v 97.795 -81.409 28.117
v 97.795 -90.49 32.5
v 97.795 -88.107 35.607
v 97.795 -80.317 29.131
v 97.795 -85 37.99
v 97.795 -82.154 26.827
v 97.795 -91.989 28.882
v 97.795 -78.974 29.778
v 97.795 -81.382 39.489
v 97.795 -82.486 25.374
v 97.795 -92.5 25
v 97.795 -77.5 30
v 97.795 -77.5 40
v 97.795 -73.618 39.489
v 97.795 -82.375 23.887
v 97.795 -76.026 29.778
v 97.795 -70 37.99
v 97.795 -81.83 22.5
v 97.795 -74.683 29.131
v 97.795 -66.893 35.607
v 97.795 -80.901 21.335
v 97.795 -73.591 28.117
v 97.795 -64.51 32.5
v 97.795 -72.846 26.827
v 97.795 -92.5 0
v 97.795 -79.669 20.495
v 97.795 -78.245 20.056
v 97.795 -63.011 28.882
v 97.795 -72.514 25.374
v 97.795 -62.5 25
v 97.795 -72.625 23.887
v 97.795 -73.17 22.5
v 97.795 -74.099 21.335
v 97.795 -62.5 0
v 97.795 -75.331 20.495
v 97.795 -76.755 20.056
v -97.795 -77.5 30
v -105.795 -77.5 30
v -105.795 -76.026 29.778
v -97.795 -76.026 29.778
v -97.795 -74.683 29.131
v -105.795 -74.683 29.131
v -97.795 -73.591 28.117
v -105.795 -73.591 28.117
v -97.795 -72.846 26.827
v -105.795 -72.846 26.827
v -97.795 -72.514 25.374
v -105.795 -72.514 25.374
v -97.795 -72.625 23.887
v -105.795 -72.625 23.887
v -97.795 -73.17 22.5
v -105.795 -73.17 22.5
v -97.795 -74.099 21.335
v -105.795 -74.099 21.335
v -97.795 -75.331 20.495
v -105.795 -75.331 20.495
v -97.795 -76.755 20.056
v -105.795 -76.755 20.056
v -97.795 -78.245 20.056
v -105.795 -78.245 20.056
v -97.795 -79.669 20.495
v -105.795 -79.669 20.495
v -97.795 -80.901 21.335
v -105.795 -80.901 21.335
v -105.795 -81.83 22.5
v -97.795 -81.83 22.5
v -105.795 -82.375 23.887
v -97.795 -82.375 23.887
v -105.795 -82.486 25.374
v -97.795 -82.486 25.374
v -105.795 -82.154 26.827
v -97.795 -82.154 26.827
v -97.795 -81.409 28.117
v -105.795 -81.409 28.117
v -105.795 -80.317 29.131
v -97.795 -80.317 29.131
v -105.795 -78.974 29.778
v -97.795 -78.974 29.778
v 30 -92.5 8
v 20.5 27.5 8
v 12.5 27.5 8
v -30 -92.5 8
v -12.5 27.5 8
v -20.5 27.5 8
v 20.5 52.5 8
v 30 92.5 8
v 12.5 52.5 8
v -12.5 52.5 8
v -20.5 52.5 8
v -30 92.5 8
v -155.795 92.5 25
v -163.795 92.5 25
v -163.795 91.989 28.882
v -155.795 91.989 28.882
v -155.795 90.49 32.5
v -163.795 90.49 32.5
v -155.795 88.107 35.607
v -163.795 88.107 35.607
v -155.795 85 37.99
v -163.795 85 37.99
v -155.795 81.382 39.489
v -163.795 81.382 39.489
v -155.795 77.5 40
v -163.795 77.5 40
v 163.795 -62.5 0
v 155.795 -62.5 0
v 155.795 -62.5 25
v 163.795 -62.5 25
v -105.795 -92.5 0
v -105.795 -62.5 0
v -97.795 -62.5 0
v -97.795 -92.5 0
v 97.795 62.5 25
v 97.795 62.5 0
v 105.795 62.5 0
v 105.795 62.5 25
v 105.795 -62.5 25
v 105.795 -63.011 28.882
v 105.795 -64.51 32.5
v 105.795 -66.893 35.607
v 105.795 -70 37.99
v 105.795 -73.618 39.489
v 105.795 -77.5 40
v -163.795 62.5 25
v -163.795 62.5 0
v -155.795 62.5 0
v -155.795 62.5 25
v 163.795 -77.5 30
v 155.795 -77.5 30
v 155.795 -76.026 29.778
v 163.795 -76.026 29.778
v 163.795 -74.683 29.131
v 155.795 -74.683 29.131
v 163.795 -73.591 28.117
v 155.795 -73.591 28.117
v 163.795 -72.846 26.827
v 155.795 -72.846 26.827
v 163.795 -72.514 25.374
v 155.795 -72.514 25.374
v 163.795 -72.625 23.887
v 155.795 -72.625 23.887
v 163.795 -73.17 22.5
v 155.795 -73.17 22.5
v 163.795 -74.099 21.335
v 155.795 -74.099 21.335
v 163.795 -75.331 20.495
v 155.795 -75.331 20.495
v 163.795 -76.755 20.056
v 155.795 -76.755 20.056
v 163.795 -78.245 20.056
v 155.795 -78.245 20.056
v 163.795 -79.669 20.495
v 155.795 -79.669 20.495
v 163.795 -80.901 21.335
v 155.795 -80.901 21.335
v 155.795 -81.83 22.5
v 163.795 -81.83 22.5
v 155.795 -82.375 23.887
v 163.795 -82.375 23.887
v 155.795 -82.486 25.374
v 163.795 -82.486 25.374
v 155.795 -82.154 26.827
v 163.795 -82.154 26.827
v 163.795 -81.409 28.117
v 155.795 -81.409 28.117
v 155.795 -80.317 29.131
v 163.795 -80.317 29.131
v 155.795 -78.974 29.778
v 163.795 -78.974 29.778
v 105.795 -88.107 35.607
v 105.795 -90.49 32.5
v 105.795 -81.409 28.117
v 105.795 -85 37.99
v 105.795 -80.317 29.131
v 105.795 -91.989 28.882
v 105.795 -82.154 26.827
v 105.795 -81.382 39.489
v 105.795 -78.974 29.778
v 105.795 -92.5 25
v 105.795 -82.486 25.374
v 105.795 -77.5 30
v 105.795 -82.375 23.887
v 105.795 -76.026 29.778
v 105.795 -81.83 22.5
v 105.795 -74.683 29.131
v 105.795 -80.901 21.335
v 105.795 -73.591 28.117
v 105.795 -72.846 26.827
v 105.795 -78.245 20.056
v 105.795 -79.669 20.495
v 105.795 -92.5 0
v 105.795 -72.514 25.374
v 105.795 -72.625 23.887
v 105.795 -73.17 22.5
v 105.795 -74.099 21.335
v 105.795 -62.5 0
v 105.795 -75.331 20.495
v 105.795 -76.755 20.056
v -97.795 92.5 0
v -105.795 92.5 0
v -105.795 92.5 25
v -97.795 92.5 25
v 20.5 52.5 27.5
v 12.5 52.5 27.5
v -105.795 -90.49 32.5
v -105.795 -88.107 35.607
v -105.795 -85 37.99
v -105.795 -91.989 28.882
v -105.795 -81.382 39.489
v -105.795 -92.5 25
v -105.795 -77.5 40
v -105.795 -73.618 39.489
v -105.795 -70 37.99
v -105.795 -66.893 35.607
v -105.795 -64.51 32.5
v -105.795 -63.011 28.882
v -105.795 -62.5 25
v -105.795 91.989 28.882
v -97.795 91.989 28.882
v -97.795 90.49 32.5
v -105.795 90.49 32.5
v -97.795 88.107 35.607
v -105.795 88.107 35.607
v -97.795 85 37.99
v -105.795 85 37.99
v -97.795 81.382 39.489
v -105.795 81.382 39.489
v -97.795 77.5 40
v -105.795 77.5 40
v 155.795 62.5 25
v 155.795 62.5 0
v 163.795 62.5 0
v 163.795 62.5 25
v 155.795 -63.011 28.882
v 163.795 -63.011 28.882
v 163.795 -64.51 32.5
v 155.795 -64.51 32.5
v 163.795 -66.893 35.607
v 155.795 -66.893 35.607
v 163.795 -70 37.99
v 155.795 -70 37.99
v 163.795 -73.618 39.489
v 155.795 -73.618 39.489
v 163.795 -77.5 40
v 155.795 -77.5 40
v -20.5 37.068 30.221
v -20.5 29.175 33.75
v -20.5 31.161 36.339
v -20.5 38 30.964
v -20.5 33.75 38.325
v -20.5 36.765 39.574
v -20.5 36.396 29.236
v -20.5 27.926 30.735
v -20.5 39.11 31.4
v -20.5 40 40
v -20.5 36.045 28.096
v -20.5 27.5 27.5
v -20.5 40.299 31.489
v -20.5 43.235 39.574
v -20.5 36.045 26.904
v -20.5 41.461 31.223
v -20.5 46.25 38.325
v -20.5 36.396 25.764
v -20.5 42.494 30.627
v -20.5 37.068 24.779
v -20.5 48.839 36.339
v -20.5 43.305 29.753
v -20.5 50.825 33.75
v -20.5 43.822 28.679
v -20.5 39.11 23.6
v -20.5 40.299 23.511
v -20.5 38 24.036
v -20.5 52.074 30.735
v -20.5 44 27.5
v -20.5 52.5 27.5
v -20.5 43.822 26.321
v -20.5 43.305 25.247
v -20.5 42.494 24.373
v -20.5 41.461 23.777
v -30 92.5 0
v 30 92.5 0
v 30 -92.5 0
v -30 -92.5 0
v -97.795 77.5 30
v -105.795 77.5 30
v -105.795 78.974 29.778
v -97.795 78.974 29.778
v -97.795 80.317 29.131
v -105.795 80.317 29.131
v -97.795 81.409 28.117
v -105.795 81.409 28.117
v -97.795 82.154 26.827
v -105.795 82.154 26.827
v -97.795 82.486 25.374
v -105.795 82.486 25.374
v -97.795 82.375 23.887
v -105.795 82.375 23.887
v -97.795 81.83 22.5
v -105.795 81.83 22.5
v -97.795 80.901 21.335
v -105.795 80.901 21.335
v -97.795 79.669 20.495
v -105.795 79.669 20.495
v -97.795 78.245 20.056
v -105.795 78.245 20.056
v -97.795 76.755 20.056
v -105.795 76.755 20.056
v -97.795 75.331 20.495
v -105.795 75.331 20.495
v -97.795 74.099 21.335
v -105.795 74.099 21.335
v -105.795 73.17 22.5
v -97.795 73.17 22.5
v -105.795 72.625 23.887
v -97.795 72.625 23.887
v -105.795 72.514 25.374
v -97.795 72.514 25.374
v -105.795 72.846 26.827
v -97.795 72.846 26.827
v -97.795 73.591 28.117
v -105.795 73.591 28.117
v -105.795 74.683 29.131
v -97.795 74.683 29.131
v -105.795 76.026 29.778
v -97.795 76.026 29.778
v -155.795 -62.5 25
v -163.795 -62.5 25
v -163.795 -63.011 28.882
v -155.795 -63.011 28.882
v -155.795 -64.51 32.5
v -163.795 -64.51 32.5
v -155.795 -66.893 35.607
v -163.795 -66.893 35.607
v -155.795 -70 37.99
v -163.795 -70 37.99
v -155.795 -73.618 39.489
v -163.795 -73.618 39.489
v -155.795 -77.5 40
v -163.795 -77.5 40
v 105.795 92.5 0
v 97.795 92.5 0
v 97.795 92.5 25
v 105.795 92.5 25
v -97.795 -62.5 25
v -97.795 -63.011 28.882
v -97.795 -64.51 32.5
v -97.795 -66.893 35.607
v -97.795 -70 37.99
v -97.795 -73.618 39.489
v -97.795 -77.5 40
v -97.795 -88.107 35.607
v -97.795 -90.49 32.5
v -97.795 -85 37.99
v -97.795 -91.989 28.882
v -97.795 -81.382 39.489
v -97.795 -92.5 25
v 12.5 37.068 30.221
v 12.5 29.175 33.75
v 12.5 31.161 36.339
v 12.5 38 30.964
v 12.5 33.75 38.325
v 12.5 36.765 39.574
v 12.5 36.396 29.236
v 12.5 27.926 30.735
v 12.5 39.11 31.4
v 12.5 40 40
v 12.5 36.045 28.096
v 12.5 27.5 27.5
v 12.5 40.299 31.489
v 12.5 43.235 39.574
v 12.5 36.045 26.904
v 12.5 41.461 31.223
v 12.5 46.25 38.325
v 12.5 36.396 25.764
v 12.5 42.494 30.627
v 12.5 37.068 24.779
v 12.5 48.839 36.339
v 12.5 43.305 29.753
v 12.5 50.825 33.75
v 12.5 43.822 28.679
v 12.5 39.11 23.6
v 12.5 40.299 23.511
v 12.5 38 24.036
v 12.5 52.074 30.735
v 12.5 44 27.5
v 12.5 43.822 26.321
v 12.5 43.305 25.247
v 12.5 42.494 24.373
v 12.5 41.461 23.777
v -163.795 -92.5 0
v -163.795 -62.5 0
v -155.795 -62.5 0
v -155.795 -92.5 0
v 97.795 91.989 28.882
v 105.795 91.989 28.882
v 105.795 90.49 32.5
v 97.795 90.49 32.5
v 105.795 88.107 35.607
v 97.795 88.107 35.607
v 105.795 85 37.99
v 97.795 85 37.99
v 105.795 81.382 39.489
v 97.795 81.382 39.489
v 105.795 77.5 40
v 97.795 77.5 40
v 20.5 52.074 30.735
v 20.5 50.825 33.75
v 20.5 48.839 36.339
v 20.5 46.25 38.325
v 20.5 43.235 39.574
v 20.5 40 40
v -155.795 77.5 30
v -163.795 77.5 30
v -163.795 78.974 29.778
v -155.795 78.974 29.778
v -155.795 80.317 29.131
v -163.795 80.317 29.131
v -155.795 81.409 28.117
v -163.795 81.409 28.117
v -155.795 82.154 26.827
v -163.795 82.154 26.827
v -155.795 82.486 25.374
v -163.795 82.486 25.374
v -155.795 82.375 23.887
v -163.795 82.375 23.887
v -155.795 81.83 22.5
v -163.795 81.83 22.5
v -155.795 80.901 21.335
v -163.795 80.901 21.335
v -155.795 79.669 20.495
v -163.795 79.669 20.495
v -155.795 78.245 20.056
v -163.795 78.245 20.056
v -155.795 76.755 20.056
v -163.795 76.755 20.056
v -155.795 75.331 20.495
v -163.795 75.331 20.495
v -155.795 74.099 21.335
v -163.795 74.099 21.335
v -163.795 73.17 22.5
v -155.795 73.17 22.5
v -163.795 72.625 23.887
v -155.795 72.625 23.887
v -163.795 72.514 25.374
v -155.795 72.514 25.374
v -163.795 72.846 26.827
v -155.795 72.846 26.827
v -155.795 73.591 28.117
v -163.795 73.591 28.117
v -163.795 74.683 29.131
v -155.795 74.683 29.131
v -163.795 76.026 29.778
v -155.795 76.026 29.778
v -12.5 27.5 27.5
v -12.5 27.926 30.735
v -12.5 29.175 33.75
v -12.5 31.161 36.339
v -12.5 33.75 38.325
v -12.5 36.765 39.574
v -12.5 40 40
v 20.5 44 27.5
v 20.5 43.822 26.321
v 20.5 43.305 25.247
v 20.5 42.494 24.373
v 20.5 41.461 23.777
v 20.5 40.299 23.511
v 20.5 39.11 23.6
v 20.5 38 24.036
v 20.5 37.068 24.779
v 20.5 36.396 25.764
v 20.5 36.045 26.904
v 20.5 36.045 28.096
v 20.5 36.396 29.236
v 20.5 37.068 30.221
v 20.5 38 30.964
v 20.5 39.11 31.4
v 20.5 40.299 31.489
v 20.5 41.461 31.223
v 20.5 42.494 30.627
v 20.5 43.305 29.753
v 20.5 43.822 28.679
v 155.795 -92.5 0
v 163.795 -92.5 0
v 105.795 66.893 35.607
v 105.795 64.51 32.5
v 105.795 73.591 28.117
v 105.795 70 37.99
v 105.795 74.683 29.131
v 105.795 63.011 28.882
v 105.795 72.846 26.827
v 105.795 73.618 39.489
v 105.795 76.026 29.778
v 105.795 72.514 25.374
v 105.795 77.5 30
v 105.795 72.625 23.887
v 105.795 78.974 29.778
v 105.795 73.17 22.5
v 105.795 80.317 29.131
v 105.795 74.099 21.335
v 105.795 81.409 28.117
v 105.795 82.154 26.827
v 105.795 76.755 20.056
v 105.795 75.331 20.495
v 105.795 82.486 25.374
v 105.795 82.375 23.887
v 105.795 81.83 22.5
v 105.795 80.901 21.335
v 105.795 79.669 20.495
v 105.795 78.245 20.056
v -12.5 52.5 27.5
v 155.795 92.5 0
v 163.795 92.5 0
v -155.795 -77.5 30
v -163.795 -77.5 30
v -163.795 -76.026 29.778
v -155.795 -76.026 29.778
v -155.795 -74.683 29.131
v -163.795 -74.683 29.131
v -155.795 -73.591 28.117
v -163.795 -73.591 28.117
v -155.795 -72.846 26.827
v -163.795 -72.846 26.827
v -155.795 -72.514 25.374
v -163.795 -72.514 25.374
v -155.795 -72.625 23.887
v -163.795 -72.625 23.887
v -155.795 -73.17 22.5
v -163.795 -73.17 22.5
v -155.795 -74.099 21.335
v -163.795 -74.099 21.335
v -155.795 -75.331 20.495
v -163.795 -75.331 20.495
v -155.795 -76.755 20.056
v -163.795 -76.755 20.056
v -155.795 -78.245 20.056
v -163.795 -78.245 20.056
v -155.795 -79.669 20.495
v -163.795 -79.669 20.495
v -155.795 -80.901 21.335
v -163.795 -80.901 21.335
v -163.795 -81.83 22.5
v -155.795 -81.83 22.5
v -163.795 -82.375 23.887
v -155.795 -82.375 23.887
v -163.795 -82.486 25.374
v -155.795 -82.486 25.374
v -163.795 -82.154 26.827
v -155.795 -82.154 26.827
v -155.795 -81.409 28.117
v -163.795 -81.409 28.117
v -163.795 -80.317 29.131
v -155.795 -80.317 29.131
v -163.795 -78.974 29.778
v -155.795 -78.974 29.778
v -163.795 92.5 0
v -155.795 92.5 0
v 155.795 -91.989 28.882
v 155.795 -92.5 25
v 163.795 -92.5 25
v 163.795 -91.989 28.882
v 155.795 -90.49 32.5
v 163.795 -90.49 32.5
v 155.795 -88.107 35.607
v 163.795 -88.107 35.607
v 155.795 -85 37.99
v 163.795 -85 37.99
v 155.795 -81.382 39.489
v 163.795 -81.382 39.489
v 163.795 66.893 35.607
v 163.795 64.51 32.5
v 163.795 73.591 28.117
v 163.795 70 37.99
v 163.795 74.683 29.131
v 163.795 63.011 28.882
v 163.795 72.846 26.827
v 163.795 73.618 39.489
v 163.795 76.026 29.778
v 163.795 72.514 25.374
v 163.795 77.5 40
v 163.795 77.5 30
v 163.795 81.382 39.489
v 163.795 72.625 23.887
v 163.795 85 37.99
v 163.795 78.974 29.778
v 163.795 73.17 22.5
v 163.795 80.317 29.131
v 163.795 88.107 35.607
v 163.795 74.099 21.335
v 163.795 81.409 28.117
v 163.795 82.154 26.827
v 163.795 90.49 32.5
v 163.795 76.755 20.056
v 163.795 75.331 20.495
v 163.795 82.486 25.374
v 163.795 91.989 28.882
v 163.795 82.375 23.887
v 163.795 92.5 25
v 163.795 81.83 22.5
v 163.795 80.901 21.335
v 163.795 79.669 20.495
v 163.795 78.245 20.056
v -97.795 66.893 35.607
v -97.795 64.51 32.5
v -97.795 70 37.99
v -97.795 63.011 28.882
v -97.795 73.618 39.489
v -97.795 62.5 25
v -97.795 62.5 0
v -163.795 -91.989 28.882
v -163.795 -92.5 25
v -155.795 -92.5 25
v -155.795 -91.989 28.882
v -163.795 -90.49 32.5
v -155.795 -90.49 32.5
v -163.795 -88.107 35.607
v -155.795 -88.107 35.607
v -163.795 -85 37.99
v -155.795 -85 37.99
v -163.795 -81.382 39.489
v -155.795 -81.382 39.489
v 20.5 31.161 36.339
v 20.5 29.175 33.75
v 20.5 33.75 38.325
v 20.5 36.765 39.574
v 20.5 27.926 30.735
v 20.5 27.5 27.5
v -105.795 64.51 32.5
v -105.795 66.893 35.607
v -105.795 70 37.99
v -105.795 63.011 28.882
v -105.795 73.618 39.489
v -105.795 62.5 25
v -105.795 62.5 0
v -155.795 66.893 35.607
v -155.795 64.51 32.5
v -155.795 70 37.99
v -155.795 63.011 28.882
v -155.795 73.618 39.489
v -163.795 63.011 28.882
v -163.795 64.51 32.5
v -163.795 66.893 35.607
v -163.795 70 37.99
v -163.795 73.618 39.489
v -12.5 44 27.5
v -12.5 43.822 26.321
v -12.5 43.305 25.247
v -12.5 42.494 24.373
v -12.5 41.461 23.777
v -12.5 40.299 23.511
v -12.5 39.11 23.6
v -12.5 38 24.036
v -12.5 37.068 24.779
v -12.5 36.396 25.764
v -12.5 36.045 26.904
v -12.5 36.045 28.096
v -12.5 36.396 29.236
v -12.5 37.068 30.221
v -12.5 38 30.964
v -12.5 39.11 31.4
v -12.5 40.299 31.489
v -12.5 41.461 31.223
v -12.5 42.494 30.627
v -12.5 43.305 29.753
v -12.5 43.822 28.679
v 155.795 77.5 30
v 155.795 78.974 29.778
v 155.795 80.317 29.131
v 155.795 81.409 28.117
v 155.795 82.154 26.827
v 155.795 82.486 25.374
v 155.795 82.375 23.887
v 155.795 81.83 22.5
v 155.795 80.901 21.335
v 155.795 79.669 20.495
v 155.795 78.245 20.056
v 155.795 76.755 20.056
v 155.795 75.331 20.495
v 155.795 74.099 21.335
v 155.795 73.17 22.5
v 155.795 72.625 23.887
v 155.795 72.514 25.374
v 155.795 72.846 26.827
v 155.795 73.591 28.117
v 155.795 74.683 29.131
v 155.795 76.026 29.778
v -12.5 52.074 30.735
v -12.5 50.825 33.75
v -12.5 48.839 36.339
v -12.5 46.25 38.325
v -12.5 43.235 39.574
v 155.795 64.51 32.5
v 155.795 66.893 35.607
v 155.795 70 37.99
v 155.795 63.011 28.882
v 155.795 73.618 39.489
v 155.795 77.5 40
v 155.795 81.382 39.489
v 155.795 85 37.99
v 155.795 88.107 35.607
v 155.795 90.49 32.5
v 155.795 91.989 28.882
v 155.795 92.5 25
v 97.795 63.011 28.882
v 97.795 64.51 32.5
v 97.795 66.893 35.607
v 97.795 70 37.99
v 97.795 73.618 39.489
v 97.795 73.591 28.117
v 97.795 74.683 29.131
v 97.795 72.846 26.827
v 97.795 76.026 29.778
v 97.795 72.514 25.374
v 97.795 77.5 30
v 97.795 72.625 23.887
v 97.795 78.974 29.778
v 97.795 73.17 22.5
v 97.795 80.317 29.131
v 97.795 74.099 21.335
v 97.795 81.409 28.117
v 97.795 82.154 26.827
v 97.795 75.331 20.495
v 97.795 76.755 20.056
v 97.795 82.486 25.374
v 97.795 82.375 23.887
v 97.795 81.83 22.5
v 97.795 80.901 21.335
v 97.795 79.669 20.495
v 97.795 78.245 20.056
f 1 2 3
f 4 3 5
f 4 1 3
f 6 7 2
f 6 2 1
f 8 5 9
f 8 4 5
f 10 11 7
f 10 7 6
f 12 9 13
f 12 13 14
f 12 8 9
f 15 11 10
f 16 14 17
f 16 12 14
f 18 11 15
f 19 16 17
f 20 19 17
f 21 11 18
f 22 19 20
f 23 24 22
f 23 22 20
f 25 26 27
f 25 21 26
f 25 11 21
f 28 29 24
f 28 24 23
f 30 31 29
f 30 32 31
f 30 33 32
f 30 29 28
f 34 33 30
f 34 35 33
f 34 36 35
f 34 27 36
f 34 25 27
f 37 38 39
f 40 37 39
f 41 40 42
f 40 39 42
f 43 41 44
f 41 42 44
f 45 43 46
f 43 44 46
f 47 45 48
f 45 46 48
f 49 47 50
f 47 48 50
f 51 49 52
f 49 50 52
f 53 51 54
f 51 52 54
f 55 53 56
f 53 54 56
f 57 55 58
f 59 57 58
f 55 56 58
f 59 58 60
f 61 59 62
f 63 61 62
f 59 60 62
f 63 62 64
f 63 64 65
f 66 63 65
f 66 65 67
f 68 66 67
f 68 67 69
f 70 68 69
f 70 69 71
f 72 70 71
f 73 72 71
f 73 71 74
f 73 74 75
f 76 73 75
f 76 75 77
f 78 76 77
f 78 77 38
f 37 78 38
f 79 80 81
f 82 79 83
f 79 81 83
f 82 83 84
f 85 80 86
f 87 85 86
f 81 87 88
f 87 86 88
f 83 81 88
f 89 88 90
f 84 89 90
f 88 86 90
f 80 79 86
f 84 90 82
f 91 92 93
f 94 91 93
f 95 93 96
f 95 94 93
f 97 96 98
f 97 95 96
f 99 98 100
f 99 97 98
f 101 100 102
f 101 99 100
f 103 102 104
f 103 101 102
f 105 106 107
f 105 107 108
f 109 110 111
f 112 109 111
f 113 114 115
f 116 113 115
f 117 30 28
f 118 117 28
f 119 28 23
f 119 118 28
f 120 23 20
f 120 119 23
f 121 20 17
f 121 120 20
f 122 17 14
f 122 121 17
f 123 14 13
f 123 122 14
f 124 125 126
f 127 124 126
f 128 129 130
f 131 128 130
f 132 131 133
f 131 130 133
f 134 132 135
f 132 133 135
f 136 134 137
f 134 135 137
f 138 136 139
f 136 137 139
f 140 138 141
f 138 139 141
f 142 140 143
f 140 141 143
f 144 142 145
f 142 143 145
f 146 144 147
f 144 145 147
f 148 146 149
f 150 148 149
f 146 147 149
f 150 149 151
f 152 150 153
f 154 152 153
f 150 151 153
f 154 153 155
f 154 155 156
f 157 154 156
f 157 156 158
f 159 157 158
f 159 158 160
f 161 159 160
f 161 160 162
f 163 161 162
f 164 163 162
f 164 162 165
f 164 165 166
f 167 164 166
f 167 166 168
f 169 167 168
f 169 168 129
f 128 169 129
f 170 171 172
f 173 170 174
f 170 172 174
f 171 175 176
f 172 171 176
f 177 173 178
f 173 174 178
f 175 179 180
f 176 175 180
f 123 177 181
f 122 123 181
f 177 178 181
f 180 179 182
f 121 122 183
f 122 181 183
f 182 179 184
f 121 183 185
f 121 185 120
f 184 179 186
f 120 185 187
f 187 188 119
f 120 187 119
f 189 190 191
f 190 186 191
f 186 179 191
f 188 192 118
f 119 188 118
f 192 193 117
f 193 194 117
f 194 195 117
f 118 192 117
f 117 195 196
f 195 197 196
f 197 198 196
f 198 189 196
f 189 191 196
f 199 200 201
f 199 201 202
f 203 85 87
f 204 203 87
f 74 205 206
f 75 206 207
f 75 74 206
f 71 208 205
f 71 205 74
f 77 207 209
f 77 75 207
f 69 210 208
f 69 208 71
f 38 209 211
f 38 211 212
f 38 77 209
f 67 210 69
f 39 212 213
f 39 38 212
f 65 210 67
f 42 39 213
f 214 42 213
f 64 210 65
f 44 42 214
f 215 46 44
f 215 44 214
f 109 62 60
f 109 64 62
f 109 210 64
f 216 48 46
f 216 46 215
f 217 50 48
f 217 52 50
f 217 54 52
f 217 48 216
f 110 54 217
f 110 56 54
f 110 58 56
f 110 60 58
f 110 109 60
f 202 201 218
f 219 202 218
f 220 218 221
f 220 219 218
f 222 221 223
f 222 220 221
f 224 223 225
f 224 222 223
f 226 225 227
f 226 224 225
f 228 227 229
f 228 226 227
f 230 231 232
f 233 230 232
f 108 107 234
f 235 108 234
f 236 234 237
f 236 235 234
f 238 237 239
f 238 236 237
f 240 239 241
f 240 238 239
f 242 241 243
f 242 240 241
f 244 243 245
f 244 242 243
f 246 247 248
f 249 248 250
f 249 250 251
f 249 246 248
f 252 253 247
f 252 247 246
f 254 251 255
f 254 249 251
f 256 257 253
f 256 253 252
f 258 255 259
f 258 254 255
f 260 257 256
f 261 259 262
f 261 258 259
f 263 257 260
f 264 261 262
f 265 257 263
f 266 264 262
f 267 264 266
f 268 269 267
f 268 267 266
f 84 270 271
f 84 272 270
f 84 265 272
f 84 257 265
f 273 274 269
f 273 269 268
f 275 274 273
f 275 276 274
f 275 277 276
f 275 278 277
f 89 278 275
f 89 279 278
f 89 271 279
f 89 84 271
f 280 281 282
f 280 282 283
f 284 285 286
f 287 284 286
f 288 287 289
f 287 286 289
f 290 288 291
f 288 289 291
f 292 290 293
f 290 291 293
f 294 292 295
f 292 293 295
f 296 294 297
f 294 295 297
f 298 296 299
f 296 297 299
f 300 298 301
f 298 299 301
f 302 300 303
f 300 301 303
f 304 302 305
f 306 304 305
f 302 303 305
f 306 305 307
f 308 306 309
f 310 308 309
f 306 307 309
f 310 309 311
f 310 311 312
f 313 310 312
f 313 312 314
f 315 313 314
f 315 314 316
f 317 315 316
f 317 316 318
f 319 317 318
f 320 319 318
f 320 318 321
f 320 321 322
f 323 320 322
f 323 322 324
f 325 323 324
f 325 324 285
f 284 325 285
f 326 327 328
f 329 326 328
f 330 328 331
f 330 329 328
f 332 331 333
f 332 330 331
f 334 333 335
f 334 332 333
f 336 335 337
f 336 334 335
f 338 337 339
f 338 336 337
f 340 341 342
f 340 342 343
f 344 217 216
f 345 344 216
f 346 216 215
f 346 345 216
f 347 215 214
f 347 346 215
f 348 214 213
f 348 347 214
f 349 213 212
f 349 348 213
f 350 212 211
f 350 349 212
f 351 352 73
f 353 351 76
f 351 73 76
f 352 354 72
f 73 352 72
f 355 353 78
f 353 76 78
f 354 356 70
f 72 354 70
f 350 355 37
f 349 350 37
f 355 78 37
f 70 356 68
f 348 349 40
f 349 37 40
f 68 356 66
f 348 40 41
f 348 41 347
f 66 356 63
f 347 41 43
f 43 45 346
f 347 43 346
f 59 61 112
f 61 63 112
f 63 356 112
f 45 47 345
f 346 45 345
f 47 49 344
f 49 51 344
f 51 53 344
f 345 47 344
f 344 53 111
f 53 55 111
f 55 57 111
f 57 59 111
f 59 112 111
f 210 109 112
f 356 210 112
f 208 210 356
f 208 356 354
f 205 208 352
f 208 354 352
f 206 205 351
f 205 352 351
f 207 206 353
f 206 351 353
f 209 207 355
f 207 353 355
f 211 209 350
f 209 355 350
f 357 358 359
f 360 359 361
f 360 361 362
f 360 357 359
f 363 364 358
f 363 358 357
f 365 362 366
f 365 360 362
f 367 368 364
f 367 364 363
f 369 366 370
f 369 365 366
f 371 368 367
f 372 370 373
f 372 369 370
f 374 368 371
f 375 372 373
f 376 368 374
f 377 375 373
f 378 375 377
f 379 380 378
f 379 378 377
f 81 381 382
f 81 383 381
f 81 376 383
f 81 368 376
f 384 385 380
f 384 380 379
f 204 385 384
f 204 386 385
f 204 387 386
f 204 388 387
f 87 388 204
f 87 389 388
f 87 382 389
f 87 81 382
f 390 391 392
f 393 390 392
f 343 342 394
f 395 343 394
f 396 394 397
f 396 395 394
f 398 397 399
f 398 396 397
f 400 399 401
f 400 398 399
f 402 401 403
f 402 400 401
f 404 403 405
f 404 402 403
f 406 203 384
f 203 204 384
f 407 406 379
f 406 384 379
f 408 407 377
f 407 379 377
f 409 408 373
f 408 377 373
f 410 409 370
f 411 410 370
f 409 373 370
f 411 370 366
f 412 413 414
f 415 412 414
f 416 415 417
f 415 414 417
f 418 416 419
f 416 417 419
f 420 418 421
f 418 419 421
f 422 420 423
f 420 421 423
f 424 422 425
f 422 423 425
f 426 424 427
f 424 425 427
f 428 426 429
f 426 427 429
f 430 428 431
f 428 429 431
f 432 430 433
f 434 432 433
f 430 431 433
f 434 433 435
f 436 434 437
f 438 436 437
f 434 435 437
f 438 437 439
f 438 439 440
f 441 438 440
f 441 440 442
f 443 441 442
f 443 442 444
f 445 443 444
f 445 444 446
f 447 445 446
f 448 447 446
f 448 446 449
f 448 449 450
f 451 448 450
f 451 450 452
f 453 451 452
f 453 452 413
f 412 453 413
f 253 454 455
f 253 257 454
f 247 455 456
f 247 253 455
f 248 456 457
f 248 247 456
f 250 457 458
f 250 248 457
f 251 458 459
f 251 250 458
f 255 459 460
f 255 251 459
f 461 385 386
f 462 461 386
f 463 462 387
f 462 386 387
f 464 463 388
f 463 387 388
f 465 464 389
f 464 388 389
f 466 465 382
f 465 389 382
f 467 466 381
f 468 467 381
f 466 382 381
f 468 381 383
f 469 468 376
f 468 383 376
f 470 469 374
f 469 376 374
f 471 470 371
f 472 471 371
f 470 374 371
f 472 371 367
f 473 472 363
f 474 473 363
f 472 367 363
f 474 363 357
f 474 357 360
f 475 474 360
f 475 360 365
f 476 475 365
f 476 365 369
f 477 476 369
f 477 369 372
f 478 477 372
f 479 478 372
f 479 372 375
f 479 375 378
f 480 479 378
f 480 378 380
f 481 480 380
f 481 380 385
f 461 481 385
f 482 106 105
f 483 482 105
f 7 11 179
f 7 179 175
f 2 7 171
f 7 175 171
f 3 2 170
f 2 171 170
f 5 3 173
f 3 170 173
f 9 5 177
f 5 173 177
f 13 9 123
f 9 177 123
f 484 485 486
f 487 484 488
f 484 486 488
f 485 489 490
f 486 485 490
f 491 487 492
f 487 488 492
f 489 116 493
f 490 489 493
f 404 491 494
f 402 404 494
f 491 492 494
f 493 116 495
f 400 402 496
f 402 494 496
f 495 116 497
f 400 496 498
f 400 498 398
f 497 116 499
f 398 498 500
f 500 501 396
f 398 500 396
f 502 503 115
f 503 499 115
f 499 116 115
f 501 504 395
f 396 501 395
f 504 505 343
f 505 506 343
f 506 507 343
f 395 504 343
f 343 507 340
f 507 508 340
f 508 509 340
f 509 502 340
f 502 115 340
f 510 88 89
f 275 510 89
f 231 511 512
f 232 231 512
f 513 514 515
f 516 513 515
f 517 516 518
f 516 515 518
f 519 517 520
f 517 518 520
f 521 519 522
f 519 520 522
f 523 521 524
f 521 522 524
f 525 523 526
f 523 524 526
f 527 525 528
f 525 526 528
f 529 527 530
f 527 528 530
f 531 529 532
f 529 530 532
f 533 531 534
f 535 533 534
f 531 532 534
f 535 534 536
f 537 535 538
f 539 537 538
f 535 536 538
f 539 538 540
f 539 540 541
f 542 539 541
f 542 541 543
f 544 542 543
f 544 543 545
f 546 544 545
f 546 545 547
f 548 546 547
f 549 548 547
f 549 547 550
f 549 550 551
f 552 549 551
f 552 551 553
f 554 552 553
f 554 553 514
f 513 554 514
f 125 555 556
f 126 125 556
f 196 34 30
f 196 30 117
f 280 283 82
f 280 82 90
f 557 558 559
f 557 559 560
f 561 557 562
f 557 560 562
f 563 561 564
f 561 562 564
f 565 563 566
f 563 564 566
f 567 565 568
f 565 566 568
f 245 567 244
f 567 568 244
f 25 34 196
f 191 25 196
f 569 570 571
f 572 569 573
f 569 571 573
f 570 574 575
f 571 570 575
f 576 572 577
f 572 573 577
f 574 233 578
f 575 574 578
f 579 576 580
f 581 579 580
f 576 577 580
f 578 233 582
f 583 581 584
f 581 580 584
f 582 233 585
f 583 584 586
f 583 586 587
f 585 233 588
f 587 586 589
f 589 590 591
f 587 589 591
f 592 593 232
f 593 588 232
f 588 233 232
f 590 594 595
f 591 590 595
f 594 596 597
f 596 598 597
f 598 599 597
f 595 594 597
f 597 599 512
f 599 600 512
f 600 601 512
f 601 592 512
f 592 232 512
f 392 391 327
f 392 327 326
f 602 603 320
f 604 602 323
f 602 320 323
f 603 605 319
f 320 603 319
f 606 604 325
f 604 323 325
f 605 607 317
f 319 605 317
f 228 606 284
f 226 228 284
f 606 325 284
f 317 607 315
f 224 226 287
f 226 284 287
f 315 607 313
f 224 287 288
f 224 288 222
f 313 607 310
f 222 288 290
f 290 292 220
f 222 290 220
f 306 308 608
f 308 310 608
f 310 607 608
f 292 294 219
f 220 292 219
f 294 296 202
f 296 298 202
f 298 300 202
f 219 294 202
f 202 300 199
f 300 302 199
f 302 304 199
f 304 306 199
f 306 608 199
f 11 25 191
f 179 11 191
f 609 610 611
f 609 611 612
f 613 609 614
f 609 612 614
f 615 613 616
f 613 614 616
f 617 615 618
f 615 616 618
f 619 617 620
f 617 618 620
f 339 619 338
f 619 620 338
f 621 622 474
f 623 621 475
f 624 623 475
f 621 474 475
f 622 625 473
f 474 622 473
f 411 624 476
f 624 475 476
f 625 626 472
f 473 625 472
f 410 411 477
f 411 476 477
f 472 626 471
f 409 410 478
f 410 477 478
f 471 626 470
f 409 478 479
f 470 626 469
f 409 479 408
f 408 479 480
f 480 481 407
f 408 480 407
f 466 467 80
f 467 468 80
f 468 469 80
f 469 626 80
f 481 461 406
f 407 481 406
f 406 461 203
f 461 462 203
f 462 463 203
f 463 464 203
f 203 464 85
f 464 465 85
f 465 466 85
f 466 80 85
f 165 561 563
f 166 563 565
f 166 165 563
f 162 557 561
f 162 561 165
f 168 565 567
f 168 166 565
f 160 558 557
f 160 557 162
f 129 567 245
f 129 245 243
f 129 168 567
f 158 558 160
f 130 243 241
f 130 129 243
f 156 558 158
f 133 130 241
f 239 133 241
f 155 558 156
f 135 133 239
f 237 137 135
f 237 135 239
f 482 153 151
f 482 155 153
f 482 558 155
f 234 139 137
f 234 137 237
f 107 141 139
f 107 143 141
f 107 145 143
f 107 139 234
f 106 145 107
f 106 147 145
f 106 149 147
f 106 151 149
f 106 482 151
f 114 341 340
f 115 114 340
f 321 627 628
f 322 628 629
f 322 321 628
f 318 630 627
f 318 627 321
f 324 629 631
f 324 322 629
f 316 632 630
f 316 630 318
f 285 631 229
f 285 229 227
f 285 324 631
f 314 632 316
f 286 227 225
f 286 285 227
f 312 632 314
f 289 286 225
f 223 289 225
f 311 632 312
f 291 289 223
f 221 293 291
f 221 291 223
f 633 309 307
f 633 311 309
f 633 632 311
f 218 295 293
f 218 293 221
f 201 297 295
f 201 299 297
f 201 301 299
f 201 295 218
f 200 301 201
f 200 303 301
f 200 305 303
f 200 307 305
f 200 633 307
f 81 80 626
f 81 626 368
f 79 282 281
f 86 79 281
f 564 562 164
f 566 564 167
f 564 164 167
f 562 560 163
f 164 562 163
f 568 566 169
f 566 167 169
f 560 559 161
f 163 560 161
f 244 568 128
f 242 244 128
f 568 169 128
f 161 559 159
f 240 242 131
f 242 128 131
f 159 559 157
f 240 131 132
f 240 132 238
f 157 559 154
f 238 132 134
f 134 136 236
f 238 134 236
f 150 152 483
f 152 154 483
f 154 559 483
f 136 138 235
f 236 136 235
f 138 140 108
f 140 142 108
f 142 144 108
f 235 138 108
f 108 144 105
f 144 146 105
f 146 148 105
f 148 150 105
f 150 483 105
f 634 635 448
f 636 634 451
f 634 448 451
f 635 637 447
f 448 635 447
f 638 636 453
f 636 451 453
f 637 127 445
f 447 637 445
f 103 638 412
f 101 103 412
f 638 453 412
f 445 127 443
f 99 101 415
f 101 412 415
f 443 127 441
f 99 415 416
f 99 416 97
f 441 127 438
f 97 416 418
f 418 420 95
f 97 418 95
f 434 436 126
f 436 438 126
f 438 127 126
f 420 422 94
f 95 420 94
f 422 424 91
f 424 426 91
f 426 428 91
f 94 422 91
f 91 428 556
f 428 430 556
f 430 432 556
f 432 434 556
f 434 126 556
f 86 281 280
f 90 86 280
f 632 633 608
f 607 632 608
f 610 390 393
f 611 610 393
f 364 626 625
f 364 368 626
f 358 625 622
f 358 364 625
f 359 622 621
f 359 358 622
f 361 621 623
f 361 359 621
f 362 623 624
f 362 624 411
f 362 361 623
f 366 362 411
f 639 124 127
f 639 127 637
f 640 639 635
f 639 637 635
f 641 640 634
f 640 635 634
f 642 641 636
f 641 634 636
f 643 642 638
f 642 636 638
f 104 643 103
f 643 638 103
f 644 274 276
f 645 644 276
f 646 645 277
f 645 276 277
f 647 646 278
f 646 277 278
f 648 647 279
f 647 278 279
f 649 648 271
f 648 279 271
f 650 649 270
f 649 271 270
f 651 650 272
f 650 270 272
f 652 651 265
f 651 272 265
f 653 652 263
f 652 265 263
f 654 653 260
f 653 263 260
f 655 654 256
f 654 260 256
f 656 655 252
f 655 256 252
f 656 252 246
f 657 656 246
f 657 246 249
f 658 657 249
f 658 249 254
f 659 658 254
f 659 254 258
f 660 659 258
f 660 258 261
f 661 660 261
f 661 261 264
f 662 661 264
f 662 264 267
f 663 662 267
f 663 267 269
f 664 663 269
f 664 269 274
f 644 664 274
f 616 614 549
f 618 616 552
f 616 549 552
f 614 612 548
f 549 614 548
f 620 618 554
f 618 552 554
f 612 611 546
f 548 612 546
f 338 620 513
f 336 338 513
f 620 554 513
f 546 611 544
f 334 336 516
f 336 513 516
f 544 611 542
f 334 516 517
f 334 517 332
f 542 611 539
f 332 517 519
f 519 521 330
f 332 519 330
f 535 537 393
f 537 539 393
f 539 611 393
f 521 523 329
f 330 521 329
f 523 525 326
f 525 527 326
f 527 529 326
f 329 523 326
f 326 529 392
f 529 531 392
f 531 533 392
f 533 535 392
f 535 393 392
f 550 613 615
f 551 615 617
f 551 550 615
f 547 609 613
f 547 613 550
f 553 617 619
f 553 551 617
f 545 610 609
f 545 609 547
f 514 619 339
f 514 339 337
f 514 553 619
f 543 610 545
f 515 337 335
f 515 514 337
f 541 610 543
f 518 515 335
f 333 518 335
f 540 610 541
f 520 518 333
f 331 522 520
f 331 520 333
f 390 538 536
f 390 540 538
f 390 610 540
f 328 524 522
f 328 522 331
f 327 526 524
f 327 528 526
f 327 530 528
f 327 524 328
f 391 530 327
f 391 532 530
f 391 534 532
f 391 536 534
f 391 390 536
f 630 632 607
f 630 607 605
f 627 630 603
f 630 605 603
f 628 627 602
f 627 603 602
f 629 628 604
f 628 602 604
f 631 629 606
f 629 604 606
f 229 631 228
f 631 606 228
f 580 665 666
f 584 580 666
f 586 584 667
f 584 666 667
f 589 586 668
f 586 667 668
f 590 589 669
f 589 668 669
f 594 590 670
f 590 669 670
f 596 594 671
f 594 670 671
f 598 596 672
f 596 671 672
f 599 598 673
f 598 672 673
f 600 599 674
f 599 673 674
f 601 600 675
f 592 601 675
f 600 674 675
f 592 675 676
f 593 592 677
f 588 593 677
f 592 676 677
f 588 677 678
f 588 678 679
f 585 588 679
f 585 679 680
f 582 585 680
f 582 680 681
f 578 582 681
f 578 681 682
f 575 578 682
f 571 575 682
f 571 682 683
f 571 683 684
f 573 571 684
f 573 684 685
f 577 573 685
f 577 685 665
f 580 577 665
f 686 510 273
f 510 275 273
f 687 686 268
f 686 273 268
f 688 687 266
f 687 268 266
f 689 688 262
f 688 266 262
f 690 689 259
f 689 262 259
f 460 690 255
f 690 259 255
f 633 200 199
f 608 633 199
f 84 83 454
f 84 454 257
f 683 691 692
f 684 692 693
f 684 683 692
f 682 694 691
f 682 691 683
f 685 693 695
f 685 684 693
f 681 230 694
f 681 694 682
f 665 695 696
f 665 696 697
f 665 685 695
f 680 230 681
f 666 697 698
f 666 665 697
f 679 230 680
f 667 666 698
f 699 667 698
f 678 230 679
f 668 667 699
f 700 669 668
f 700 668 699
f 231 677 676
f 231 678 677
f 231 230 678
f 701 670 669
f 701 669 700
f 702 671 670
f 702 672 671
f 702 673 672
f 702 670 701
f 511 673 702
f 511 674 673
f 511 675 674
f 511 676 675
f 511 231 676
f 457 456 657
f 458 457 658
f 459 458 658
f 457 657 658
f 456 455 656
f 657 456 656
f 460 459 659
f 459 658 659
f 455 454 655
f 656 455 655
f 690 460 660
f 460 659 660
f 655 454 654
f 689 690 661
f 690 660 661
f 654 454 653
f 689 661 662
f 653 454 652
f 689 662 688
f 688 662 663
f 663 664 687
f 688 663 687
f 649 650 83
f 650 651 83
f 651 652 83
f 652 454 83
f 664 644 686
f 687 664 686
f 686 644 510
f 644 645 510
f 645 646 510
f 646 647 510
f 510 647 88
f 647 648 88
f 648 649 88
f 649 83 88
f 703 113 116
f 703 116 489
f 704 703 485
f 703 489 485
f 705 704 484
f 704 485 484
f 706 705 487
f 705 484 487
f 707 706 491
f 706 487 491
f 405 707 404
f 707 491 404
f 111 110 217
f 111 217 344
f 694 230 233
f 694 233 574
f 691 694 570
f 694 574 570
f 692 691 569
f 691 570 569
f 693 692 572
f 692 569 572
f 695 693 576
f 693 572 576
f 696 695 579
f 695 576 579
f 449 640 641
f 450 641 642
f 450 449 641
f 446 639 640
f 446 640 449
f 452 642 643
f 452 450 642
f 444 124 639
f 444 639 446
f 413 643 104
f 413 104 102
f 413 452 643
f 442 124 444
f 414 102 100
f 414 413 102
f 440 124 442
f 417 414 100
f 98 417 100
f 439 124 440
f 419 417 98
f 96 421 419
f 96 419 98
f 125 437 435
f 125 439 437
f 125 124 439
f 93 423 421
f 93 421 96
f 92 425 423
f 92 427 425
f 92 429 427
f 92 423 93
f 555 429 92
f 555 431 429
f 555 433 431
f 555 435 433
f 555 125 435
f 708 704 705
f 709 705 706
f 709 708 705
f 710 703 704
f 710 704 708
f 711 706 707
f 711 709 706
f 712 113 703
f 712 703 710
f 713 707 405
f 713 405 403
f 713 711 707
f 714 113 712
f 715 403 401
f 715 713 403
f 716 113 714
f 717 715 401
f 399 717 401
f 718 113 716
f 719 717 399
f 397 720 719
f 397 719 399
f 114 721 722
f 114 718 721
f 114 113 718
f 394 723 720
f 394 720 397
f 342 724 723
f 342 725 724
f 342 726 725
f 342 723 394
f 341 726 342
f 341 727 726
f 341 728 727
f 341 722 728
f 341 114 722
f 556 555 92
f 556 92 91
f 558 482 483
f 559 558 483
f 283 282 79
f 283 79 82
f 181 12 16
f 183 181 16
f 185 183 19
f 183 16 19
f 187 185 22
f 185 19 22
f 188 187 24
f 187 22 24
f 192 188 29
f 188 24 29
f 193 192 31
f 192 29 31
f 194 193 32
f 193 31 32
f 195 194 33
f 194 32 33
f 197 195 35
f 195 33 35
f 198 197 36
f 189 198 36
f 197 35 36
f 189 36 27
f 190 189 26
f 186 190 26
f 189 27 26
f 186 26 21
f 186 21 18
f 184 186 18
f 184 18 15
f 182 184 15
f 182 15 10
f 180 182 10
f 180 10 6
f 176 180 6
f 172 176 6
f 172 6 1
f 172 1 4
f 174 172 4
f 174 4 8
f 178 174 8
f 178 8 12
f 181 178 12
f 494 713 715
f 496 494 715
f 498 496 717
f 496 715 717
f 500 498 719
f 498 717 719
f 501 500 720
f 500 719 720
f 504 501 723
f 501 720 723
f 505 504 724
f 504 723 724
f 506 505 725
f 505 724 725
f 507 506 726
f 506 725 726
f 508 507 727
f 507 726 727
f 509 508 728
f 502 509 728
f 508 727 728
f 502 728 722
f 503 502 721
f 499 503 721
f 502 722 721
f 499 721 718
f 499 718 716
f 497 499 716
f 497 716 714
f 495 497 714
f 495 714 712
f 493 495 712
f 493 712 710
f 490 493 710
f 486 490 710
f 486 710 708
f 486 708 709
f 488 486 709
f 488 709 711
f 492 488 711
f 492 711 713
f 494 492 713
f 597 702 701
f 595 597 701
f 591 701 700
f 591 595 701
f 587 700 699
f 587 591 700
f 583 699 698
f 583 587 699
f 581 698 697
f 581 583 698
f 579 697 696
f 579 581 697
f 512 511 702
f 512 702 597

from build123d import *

# Parameters (mm, degrees)
SKETCH1_W             = 8
SKETCH1_H             = 30
BOSS_EXTRUDE1_DEPTH   = 40
BOSS_EXTRUDE1_2_DEPTH = 40
BOSS_EXTRUDE1_3_DEPTH = 40
BOSS_EXTRUDE1_4_DEPTH = 40
BOSS_EXTRUDE1_5_DEPTH = 40
BOSS_EXTRUDE1_6_DEPTH = 40
BOSS_EXTRUDE1_7_DEPTH = 40
BOSS_EXTRUDE1_8_DEPTH = 40
FILLET1_R             = 15
FILLET2_R             = 15
FILLET3_R             = 15
FILLET4_R             = 15
FILLET5_R             = 15
FILLET6_R             = 15
FILLET7_R             = 15
FILLET8_R             = 15
SKETCH4_R             = 5
CUT_EXTRUDE2_DEPTH    = 343.741094851
SKETCH3_R             = 5
CUT_EXTRUDE1_DEPTH    = 343.741094851
SKETCH5_W             = 60
SKETCH5_H             = 185
BOSS_EXTRUDE2_DEPTH   = 8
SKETCH6_W             = 8
SKETCH6_H             = 25
BOSS_EXTRUDE3_DEPTH   = 40
FILLET9_R             = 12.5
SKETCH7_R             = 4
CUT_EXTRUDE3_DEPTH    = 211.049748929


with BuildPart() as part:
    # Sketch1 → Boss-Extrude1 (new body)
    with BuildSketch(Plane.XY):
        with Locations((-159.795, 77.5)):
            Rectangle(SKETCH1_W, SKETCH1_H)
    extrude(amount=BOSS_EXTRUDE1_DEPTH)

    # Fillet1
    fillet1_edges = [part.edges().sort_by_distance(p)[0] for p in [
        (-159.795, 62.5, 40),
        (-159.795, 92.5, 40),
    ]]
    fillet(fillet1_edges, radius=FILLET1_R - 0.0001)  # a hair under: the kernel refuses the full size


with BuildPart() as body_2:
    # Sketch1 → Boss-Extrude1 2 (new body)
    with BuildSketch(Plane.XY):
        with Locations((-101.795, 77.5)):
            Rectangle(SKETCH1_W, SKETCH1_H)
    extrude(amount=BOSS_EXTRUDE1_2_DEPTH)

    # Fillet2
    fillet2_edges = [body_2.edges().sort_by_distance(p)[0] for p in [
        (-101.795, 62.5, 40),
        (-101.795, 92.5, 40),
    ]]
    fillet(fillet2_edges, radius=FILLET2_R - 0.0001)  # a hair under: the kernel refuses the full size


with BuildPart() as body_3:
    # Sketch1 → Boss-Extrude1 3 (new body)
    with BuildSketch(Plane.XY):
        with Locations((101.795, 77.5)):
            Rectangle(SKETCH1_W, SKETCH1_H)
    extrude(amount=BOSS_EXTRUDE1_3_DEPTH)

    # Fillet3
    fillet3_edges = [body_3.edges().sort_by_distance(p)[0] for p in [
        (101.795, 62.5, 40),
        (101.795, 92.5, 40),
    ]]
    fillet(fillet3_edges, radius=FILLET3_R - 0.0001)  # a hair under: the kernel refuses the full size


with BuildPart() as body_4:
    # Sketch1 → Boss-Extrude1 4 (new body)
    with BuildSketch(Plane.XY):
        with Locations((159.795, 77.5)):
            Rectangle(SKETCH1_W, SKETCH1_H)
    extrude(amount=BOSS_EXTRUDE1_4_DEPTH)

    # Fillet4
    fillet4_edges = [body_4.edges().sort_by_distance(p)[0] for p in [
        (159.795, 62.5, 40),
        (159.795, 92.5, 40),
    ]]
    fillet(fillet4_edges, radius=FILLET4_R - 0.0001)  # a hair under: the kernel refuses the full size


with BuildPart() as body_5:
    # Sketch1 → Boss-Extrude1 5 (new body)
    with BuildSketch(Plane.XY):
        with Locations((159.795, -77.5)):
            Rectangle(SKETCH1_W, SKETCH1_H)
    extrude(amount=BOSS_EXTRUDE1_5_DEPTH)

    # Fillet8
    fillet8_edges = [body_5.edges().sort_by_distance(p)[0] for p in [
        (159.795, -92.5, 40),
        (159.795, -62.5, 40),
    ]]
    fillet(fillet8_edges, radius=FILLET8_R - 0.0001)  # a hair under: the kernel refuses the full size


with BuildPart() as body_6:
    # Sketch1 → Boss-Extrude1 6 (new body)
    with BuildSketch(Plane.XY):
        with Locations((101.795, -77.5)):
            Rectangle(SKETCH1_W, SKETCH1_H)
    extrude(amount=BOSS_EXTRUDE1_6_DEPTH)

    # Fillet7
    fillet7_edges = [body_6.edges().sort_by_distance(p)[0] for p in [
        (101.795, -92.5, 40),
        (101.795, -62.5, 40),
    ]]
    fillet(fillet7_edges, radius=FILLET7_R - 0.0001)  # a hair under: the kernel refuses the full size


with BuildPart() as body_7:
    # Sketch1 → Boss-Extrude1 7 (new body)
    with BuildSketch(Plane.XY):
        with Locations((-101.795, -77.5)):
            Rectangle(SKETCH1_W, SKETCH1_H)
    extrude(amount=BOSS_EXTRUDE1_7_DEPTH)

    # Fillet6
    fillet6_edges = [body_7.edges().sort_by_distance(p)[0] for p in [
        (-101.795, -92.5, 40),
        (-101.795, -62.5, 40),
    ]]
    fillet(fillet6_edges, radius=FILLET6_R - 0.0001)  # a hair under: the kernel refuses the full size


with BuildPart() as body_8:
    # Sketch1 → Boss-Extrude1 8 (new body)
    with BuildSketch(Plane.XY):
        with Locations((-159.795, -77.5)):
            Rectangle(SKETCH1_W, SKETCH1_H)
    extrude(amount=BOSS_EXTRUDE1_8_DEPTH)

    # Fillet5
    fillet5_edges = [body_8.edges().sort_by_distance(p)[0] for p in [
        (-159.795, -92.5, 40),
        (-159.795, -62.5, 40),
    ]]
    fillet(fillet5_edges, radius=FILLET5_R - 0.0001)  # a hair under: the kernel refuses the full size


with BuildPart() as cut_extrude2_tool:
    # Sketch4 → Cut-Extrude2 (new, through all)
    with BuildSketch(Plane.ZY.offset(163.795)):
        with Locations((25, -77.5)):
            Circle(SKETCH4_R)
    extrude(amount=-CUT_EXTRUDE2_DEPTH)


with BuildPart() as body_5_1:
    add(body_5.part)

    # Cut-Extrude2: cut by cut_extrude2_tool
    add(cut_extrude2_tool.part, mode=Mode.SUBTRACT)


with BuildPart() as body_6_1:
    add(body_6.part)

    # Cut-Extrude2: cut by cut_extrude2_tool
    add(cut_extrude2_tool.part, mode=Mode.SUBTRACT)


with BuildPart() as body_7_1:
    add(body_7.part)

    # Cut-Extrude2: cut by cut_extrude2_tool
    add(cut_extrude2_tool.part, mode=Mode.SUBTRACT)


with BuildPart() as body_8_1:
    add(body_8.part)

    # Cut-Extrude2: cut by cut_extrude2_tool
    add(cut_extrude2_tool.part, mode=Mode.SUBTRACT)


with BuildPart() as cut_extrude1_tool:
    # Sketch3 → Cut-Extrude1 (new, through all)
    with BuildSketch(Plane.ZY.offset(163.795)):
        with Locations((25, 77.5)):
            Circle(SKETCH3_R)
    extrude(amount=-CUT_EXTRUDE1_DEPTH)


with BuildPart() as part_1:
    add(part.part)

    # Cut-Extrude1: cut by cut_extrude1_tool
    add(cut_extrude1_tool.part, mode=Mode.SUBTRACT)


with BuildPart() as body_2_1:
    add(body_2.part)

    # Cut-Extrude1: cut by cut_extrude1_tool
    add(cut_extrude1_tool.part, mode=Mode.SUBTRACT)


with BuildPart() as body_3_1:
    add(body_3.part)

    # Cut-Extrude1: cut by cut_extrude1_tool
    add(cut_extrude1_tool.part, mode=Mode.SUBTRACT)


with BuildPart() as body_4_1:
    add(body_4.part)

    # Cut-Extrude1: cut by cut_extrude1_tool
    add(cut_extrude1_tool.part, mode=Mode.SUBTRACT)


with BuildPart() as body_9:
    # Sketch5 → Boss-Extrude2 (new body)
    with BuildSketch(Plane(origin=(0, 0, 0), x_dir=(-1, 0, 0), z_dir=(0, 0, -1))):
        Rectangle(SKETCH5_W, SKETCH5_H)
    extrude(amount=-BOSS_EXTRUDE2_DEPTH)

    # Sketch6 → Boss-Extrude3 (add)
    with BuildSketch(Plane(origin=(0, 0, 0), x_dir=(-1, 0, 0), z_dir=(0, 0, -1))):
        with Locations((16.5, 40)):
            Rectangle(SKETCH6_W, SKETCH6_H)
        with Locations((-16.5, 40)):
            Rectangle(SKETCH6_W, SKETCH6_H)
    extrude(amount=-BOSS_EXTRUDE3_DEPTH)

    # Fillet9
    fillet9_edges = [body_9.edges().sort_by_distance(p)[0] for p in [
        (16.5, 52.5, 40),
        (16.5, 27.5, 40),
        (-16.5, 52.5, 40),
        (-16.5, 27.5, 40),
    ]]
    fillet(fillet9_edges, radius=FILLET9_R - 0.0001)  # a hair under: the kernel refuses the full size

    # Sketch7 → Cut-Extrude3 (cut, through all)
    with BuildSketch(Plane.ZY.offset(20.5)):
        with Locations(Location((27.5, 40, 0), (0, 0, 90))):
            Circle(SKETCH7_R)
    extrude(amount=-CUT_EXTRUDE3_DEPTH, mode=Mode.SUBTRACT)


solid = Compound([body_5_1.part, body_6_1.part, body_7_1.part, body_8_1.part, part_1.part, body_2_1.part, body_3_1.part, body_4_1.part, body_9.part])
